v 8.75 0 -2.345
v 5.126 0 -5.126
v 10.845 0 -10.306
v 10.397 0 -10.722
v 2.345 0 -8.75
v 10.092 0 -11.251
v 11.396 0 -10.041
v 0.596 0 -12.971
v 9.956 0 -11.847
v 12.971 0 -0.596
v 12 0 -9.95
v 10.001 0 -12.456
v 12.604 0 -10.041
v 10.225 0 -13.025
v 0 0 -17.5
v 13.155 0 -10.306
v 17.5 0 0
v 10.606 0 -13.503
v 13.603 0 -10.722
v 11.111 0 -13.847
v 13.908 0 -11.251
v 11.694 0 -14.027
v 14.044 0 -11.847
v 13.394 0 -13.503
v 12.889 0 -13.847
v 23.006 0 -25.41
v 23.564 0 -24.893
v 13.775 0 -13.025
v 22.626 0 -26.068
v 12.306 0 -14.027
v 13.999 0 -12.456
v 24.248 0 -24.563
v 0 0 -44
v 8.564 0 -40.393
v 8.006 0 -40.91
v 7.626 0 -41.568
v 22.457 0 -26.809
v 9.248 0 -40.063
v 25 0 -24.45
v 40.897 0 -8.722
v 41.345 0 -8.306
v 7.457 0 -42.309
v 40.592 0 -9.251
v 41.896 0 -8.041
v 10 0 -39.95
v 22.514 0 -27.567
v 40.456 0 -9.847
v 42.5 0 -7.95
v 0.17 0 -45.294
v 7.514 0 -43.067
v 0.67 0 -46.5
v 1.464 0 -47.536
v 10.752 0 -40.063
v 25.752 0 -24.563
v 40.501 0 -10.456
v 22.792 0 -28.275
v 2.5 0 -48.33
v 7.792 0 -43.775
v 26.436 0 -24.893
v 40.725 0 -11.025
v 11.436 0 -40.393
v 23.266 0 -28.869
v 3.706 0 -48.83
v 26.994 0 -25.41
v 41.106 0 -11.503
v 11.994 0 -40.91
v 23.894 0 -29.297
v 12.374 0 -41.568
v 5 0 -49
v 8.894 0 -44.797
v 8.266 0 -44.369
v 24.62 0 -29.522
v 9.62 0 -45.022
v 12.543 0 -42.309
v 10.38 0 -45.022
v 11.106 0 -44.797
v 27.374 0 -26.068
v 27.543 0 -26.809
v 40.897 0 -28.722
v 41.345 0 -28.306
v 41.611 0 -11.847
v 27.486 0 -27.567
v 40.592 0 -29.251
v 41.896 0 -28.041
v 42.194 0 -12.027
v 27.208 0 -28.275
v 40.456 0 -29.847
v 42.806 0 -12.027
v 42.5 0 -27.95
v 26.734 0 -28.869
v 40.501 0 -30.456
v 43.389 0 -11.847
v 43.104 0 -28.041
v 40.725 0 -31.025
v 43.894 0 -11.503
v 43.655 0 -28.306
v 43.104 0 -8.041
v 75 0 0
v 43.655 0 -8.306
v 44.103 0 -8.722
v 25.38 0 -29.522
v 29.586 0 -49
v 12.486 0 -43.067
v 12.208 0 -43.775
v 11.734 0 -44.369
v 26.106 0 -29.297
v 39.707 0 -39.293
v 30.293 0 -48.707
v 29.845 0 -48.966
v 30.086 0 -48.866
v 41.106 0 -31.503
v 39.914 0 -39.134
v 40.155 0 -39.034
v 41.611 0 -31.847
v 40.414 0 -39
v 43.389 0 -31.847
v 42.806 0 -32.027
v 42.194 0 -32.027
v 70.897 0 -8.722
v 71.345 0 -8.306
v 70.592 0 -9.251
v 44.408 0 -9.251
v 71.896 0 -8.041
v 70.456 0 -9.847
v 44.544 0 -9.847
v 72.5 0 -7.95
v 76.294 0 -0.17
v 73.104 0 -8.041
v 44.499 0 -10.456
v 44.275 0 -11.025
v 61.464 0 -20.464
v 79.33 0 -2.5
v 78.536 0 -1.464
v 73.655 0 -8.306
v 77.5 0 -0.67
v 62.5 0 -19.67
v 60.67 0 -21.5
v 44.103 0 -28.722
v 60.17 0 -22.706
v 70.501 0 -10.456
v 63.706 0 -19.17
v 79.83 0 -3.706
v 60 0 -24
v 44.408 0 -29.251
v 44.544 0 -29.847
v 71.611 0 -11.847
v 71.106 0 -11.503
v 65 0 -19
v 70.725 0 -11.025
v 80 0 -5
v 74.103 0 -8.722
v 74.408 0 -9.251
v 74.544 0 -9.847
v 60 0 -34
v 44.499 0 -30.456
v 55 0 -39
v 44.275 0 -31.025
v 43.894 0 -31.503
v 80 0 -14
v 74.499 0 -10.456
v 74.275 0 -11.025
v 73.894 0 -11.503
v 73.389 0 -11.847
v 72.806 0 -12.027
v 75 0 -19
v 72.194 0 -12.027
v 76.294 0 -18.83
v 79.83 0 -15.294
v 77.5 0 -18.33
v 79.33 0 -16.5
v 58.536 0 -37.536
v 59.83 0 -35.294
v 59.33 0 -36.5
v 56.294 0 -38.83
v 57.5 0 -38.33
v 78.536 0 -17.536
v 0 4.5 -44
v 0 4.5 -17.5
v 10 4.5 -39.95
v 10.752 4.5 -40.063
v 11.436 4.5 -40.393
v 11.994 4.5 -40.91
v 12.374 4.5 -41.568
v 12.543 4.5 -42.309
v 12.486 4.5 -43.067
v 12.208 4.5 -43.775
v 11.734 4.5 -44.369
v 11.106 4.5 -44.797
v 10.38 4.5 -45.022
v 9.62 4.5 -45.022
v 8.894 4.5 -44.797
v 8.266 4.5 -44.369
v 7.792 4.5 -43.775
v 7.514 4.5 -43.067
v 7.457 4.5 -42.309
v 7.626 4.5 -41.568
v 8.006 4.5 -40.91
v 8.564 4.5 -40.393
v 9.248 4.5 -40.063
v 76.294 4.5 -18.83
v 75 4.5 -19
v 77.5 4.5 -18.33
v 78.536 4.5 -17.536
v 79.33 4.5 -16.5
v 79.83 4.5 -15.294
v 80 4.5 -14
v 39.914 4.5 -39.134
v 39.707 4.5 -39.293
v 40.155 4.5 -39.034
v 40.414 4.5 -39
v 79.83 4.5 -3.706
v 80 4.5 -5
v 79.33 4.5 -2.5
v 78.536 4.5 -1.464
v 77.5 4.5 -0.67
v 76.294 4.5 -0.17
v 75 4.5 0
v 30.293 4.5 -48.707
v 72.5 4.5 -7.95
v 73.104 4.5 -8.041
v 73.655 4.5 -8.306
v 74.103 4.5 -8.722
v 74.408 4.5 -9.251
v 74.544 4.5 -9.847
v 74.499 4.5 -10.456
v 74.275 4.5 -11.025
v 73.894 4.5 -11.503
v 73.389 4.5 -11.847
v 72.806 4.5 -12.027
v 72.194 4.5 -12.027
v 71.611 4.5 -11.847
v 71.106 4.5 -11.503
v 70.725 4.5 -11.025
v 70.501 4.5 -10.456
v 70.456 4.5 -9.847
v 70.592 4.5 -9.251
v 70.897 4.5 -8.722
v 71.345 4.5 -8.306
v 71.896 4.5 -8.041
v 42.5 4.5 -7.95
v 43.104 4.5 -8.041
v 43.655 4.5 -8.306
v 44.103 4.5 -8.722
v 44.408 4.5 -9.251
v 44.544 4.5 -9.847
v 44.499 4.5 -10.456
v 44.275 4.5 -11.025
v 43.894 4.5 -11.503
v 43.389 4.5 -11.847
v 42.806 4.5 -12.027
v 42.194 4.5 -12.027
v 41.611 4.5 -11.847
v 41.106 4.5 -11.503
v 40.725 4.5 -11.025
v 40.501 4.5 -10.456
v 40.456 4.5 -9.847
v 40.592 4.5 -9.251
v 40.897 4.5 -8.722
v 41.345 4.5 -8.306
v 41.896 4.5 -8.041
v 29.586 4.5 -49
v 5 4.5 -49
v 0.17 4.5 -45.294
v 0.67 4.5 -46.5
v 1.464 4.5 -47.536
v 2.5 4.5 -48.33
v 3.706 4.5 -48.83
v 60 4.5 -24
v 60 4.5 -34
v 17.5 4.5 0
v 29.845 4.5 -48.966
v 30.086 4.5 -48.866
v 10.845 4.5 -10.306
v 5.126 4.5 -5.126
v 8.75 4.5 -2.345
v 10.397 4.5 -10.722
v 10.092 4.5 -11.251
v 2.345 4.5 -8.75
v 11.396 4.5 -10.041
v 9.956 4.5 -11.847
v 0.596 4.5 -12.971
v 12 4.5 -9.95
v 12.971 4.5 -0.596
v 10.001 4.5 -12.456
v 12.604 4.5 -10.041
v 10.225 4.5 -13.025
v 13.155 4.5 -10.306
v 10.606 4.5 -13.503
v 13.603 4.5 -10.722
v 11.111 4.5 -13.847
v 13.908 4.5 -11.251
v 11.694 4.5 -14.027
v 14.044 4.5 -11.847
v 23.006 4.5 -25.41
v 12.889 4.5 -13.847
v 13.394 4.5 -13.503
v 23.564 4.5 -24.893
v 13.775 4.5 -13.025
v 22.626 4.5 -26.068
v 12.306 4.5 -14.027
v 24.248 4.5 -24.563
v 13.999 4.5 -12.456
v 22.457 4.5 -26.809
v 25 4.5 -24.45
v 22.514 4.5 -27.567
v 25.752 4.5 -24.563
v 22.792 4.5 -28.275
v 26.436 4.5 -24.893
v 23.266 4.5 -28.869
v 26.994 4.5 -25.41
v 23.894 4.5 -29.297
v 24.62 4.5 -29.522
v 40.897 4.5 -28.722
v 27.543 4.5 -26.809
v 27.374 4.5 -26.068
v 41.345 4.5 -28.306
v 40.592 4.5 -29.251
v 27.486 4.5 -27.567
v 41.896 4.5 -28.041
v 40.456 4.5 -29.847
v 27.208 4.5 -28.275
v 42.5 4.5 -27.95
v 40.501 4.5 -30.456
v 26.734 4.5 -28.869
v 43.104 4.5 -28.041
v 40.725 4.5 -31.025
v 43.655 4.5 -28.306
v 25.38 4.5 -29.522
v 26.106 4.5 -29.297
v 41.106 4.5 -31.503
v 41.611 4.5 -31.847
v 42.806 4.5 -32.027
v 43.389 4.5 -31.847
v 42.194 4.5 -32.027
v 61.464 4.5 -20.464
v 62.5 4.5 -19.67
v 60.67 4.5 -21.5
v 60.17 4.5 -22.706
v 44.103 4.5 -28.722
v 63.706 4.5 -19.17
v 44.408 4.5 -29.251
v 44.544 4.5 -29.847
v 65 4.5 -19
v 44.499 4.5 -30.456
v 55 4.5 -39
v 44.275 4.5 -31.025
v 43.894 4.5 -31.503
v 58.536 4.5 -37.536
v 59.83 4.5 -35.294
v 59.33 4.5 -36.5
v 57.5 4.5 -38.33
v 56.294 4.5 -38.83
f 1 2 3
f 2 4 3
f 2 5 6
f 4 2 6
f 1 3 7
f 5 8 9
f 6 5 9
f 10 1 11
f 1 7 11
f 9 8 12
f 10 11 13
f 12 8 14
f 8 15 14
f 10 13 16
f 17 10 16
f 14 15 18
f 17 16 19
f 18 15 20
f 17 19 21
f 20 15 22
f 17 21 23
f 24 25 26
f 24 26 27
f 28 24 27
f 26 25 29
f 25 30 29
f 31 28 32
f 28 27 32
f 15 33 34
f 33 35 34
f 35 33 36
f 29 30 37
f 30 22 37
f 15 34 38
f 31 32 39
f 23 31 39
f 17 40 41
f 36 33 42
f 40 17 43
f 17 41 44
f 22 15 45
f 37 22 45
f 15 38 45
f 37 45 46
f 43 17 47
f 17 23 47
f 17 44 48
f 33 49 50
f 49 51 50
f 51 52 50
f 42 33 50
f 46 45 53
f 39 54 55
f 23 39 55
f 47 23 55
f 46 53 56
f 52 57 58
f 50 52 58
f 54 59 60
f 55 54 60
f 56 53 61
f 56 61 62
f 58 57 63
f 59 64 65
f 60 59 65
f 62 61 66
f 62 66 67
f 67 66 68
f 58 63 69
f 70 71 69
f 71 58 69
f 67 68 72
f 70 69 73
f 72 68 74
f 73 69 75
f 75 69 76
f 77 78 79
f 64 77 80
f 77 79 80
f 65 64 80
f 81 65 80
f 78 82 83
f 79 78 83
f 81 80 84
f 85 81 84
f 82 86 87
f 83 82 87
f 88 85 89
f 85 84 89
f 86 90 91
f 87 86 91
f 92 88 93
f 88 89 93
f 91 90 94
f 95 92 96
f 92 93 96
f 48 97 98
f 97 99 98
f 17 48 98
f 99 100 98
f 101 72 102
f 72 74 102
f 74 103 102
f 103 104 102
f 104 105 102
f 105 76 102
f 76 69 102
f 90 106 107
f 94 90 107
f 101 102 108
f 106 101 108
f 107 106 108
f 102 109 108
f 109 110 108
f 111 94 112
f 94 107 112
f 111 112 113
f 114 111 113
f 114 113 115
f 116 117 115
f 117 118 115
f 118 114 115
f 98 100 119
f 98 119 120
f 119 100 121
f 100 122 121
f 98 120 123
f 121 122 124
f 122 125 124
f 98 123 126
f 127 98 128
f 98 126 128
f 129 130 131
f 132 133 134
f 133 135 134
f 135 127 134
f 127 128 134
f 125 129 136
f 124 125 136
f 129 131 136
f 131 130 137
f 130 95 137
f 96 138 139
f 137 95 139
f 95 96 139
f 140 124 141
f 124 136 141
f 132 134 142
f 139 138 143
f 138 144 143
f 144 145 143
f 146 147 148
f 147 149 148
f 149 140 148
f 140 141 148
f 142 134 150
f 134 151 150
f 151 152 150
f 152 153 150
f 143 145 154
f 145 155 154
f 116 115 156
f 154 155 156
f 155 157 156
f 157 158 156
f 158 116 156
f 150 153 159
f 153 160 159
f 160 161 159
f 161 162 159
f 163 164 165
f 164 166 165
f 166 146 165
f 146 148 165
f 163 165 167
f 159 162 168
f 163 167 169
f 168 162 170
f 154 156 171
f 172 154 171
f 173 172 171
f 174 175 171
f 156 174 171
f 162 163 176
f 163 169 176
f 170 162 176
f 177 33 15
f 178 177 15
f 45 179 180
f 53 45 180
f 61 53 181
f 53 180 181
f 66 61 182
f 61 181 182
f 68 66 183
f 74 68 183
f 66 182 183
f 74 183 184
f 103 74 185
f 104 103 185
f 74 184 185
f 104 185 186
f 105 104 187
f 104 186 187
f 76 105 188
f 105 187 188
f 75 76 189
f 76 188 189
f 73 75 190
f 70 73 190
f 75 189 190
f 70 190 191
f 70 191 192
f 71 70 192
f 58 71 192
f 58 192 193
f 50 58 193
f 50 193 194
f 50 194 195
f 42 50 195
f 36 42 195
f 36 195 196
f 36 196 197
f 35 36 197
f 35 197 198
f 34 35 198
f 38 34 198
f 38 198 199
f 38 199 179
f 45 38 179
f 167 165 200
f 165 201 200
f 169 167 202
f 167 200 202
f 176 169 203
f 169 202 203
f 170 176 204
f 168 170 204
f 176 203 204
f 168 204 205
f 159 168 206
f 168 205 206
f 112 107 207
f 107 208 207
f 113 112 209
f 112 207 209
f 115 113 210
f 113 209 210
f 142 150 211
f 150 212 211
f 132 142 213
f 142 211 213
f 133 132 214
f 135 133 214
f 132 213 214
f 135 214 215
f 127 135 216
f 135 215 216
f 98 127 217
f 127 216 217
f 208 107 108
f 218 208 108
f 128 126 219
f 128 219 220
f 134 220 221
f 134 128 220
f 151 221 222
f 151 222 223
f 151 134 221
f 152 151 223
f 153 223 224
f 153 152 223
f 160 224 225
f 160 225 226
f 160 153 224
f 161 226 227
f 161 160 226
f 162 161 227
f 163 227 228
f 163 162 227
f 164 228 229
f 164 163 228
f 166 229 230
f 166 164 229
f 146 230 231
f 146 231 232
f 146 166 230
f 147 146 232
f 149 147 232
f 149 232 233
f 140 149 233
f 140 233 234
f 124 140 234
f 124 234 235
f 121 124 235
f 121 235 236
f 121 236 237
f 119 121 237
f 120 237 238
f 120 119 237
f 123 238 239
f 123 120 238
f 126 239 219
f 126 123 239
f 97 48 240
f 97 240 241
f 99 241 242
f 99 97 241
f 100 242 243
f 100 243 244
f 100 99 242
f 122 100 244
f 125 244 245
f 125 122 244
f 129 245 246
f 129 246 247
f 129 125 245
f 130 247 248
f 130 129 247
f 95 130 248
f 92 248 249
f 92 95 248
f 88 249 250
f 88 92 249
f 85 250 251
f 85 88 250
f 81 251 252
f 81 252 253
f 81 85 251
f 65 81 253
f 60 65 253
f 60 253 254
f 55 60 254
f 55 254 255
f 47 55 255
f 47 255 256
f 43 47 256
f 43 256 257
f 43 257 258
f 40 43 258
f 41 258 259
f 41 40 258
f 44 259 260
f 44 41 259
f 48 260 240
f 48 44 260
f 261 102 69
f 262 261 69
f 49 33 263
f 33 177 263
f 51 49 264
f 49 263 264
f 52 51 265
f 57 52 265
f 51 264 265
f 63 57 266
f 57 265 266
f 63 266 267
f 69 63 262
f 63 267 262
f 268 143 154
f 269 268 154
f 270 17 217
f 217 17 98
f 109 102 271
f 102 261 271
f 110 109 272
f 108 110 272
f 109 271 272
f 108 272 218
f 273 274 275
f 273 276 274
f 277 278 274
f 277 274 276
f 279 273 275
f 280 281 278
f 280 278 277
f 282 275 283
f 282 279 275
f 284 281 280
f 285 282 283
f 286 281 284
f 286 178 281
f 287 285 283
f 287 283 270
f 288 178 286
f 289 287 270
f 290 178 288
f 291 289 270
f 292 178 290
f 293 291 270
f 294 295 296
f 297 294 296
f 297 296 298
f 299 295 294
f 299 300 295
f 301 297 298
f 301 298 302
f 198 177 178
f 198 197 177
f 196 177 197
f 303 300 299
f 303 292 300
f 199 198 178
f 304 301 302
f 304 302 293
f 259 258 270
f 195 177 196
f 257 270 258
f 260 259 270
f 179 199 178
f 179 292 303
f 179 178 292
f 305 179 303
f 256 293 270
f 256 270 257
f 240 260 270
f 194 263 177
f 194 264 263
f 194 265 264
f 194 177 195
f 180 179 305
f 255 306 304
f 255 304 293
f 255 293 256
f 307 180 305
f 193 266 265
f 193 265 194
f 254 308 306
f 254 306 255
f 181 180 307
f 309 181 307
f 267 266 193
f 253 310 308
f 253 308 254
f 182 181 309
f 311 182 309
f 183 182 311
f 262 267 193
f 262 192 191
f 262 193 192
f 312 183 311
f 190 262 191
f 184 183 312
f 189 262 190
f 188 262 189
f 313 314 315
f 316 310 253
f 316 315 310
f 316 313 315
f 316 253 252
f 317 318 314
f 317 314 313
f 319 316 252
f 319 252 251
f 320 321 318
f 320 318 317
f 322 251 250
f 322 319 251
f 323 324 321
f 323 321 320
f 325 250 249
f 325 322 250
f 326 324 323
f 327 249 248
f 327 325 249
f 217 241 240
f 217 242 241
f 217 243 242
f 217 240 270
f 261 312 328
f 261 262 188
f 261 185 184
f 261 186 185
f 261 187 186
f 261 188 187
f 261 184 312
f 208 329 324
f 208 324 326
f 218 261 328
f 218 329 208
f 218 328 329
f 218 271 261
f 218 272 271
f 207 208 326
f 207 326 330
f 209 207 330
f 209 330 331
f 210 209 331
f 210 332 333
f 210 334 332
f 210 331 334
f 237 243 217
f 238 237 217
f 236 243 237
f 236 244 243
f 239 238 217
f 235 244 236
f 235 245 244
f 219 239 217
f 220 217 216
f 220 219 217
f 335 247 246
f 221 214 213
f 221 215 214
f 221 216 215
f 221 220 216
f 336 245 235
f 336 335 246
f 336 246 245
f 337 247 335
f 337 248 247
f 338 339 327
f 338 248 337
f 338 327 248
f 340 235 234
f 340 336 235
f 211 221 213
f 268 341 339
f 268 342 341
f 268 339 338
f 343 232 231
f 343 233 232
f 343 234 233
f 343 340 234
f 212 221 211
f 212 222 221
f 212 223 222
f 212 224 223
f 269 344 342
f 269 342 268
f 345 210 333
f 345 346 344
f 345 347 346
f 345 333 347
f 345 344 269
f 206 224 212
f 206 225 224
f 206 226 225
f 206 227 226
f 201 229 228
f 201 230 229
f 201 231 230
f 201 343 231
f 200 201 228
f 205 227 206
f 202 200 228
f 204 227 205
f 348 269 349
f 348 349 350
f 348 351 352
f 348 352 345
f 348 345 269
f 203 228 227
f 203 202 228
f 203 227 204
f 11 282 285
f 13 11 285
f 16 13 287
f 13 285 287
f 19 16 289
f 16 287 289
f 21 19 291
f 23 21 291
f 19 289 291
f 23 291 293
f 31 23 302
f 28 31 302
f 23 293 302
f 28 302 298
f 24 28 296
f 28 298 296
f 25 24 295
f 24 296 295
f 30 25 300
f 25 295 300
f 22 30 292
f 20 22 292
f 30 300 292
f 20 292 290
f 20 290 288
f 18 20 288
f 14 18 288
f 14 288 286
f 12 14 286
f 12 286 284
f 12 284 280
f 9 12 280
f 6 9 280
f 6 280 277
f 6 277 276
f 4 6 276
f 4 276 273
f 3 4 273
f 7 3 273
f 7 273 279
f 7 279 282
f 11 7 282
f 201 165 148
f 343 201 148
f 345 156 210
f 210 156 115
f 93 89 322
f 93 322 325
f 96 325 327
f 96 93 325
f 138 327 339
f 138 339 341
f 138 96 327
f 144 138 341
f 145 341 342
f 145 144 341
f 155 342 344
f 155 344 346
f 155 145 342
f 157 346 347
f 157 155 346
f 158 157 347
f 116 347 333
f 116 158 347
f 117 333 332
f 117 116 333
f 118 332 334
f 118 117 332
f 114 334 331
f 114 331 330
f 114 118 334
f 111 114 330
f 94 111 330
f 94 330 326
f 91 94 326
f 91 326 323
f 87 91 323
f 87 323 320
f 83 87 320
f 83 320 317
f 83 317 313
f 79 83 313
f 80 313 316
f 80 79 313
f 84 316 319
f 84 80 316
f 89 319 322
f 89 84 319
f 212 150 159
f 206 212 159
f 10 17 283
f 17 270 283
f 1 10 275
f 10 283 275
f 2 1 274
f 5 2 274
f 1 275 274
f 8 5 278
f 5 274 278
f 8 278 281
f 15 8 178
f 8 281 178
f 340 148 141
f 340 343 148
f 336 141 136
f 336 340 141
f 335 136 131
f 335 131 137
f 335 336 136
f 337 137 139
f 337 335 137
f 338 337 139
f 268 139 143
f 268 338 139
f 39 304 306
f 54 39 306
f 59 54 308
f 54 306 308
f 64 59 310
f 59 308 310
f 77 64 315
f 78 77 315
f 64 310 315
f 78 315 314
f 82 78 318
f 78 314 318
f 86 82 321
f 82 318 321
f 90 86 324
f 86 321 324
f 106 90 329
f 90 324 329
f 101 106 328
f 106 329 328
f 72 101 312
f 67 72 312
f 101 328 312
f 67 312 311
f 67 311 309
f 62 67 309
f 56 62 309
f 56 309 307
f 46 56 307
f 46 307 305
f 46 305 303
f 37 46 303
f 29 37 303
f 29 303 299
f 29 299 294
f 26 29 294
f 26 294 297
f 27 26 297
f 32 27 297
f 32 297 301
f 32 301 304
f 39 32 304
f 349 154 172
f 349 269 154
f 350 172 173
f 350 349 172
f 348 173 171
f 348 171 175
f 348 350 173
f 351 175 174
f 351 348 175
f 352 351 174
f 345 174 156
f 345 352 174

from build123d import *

# Parameters (mm, degrees)
SKETCH1_R           = 2.05
BOSS_EXTRUDE1_DEPTH = 4.5
SKETCH2_R           = 2.55
SKETCH2_R_2         = 2.05
CUT_EXTRUDE1_DEPTH  = 94.921509783
FILLET1_R           = 5
FILLET2_R           = 17.5
FILLET3_R           = 1


with BuildPart() as part:
    # Sketch1 → Boss-Extrude1 (new body)
    with BuildSketch(Plane(origin=(0, 0, 0), x_dir=(1, 0, 0), z_dir=(0, 1, 0))):
        Polygon((80, 19), (60, 19), (60, 39), (40, 39), (30, 49), (0, 49), (0, 0), (80, 0), align=None)
        with Locations(Location((72.5, 10, 0), (0, 0, 270))):
            Circle(SKETCH1_R, mode=Mode.SUBTRACT)
        with Locations(Location((42.5, 10, 0), (0, 0, 270))):
            Circle(SKETCH1_R, mode=Mode.SUBTRACT)
        with Locations(Location((42.5, 30, 0), (0, 0, 270))):
            Circle(SKETCH1_R, mode=Mode.SUBTRACT)
    extrude(amount=BOSS_EXTRUDE1_DEPTH)

    # Sketch2 → Cut-Extrude1 (cut, through all)
    with BuildSketch(Plane(origin=(0, 4.5, 0), x_dir=(1, 0, 0), z_dir=(0, 1, 0))):
        with Locations(Location((25, 27, 0), (0, 0, 270))):
            Circle(SKETCH2_R)
        with Locations(Location((10, 42.5, 0), (0, 0, 270))):
            Circle(SKETCH2_R)
        with Locations(Location((12, 12, 0), (0, 0, 270))):
            Circle(SKETCH2_R_2)
    extrude(amount=-CUT_EXTRUDE1_DEPTH, mode=Mode.SUBTRACT)

    # Fillet1
    fillet1_edges = [part.edges().sort_by_distance(p)[0] for p in [
        (0, 2.25, -49),
        (60, 2.25, -39),
        (60, 2.25, -19),
        (80, 2.25, -19),
        (80, 2.25, 0),
    ]]
    fillet(fillet1_edges, radius=FILLET1_R)

    # Fillet2
    fillet2_edges = [part.edges().sort_by_distance(p)[0] for p in [
        (0, 2.25, 0),
    ]]
    fillet(fillet2_edges, radius=FILLET2_R)

    # Fillet3
    fillet3_edges = [part.edges().sort_by_distance(p)[0] for p in [
        (30, 2.25, -49),
        (40, 2.25, -39),
    ]]
    fillet(fillet3_edges, radius=FILLET3_R)


solid = part.part
